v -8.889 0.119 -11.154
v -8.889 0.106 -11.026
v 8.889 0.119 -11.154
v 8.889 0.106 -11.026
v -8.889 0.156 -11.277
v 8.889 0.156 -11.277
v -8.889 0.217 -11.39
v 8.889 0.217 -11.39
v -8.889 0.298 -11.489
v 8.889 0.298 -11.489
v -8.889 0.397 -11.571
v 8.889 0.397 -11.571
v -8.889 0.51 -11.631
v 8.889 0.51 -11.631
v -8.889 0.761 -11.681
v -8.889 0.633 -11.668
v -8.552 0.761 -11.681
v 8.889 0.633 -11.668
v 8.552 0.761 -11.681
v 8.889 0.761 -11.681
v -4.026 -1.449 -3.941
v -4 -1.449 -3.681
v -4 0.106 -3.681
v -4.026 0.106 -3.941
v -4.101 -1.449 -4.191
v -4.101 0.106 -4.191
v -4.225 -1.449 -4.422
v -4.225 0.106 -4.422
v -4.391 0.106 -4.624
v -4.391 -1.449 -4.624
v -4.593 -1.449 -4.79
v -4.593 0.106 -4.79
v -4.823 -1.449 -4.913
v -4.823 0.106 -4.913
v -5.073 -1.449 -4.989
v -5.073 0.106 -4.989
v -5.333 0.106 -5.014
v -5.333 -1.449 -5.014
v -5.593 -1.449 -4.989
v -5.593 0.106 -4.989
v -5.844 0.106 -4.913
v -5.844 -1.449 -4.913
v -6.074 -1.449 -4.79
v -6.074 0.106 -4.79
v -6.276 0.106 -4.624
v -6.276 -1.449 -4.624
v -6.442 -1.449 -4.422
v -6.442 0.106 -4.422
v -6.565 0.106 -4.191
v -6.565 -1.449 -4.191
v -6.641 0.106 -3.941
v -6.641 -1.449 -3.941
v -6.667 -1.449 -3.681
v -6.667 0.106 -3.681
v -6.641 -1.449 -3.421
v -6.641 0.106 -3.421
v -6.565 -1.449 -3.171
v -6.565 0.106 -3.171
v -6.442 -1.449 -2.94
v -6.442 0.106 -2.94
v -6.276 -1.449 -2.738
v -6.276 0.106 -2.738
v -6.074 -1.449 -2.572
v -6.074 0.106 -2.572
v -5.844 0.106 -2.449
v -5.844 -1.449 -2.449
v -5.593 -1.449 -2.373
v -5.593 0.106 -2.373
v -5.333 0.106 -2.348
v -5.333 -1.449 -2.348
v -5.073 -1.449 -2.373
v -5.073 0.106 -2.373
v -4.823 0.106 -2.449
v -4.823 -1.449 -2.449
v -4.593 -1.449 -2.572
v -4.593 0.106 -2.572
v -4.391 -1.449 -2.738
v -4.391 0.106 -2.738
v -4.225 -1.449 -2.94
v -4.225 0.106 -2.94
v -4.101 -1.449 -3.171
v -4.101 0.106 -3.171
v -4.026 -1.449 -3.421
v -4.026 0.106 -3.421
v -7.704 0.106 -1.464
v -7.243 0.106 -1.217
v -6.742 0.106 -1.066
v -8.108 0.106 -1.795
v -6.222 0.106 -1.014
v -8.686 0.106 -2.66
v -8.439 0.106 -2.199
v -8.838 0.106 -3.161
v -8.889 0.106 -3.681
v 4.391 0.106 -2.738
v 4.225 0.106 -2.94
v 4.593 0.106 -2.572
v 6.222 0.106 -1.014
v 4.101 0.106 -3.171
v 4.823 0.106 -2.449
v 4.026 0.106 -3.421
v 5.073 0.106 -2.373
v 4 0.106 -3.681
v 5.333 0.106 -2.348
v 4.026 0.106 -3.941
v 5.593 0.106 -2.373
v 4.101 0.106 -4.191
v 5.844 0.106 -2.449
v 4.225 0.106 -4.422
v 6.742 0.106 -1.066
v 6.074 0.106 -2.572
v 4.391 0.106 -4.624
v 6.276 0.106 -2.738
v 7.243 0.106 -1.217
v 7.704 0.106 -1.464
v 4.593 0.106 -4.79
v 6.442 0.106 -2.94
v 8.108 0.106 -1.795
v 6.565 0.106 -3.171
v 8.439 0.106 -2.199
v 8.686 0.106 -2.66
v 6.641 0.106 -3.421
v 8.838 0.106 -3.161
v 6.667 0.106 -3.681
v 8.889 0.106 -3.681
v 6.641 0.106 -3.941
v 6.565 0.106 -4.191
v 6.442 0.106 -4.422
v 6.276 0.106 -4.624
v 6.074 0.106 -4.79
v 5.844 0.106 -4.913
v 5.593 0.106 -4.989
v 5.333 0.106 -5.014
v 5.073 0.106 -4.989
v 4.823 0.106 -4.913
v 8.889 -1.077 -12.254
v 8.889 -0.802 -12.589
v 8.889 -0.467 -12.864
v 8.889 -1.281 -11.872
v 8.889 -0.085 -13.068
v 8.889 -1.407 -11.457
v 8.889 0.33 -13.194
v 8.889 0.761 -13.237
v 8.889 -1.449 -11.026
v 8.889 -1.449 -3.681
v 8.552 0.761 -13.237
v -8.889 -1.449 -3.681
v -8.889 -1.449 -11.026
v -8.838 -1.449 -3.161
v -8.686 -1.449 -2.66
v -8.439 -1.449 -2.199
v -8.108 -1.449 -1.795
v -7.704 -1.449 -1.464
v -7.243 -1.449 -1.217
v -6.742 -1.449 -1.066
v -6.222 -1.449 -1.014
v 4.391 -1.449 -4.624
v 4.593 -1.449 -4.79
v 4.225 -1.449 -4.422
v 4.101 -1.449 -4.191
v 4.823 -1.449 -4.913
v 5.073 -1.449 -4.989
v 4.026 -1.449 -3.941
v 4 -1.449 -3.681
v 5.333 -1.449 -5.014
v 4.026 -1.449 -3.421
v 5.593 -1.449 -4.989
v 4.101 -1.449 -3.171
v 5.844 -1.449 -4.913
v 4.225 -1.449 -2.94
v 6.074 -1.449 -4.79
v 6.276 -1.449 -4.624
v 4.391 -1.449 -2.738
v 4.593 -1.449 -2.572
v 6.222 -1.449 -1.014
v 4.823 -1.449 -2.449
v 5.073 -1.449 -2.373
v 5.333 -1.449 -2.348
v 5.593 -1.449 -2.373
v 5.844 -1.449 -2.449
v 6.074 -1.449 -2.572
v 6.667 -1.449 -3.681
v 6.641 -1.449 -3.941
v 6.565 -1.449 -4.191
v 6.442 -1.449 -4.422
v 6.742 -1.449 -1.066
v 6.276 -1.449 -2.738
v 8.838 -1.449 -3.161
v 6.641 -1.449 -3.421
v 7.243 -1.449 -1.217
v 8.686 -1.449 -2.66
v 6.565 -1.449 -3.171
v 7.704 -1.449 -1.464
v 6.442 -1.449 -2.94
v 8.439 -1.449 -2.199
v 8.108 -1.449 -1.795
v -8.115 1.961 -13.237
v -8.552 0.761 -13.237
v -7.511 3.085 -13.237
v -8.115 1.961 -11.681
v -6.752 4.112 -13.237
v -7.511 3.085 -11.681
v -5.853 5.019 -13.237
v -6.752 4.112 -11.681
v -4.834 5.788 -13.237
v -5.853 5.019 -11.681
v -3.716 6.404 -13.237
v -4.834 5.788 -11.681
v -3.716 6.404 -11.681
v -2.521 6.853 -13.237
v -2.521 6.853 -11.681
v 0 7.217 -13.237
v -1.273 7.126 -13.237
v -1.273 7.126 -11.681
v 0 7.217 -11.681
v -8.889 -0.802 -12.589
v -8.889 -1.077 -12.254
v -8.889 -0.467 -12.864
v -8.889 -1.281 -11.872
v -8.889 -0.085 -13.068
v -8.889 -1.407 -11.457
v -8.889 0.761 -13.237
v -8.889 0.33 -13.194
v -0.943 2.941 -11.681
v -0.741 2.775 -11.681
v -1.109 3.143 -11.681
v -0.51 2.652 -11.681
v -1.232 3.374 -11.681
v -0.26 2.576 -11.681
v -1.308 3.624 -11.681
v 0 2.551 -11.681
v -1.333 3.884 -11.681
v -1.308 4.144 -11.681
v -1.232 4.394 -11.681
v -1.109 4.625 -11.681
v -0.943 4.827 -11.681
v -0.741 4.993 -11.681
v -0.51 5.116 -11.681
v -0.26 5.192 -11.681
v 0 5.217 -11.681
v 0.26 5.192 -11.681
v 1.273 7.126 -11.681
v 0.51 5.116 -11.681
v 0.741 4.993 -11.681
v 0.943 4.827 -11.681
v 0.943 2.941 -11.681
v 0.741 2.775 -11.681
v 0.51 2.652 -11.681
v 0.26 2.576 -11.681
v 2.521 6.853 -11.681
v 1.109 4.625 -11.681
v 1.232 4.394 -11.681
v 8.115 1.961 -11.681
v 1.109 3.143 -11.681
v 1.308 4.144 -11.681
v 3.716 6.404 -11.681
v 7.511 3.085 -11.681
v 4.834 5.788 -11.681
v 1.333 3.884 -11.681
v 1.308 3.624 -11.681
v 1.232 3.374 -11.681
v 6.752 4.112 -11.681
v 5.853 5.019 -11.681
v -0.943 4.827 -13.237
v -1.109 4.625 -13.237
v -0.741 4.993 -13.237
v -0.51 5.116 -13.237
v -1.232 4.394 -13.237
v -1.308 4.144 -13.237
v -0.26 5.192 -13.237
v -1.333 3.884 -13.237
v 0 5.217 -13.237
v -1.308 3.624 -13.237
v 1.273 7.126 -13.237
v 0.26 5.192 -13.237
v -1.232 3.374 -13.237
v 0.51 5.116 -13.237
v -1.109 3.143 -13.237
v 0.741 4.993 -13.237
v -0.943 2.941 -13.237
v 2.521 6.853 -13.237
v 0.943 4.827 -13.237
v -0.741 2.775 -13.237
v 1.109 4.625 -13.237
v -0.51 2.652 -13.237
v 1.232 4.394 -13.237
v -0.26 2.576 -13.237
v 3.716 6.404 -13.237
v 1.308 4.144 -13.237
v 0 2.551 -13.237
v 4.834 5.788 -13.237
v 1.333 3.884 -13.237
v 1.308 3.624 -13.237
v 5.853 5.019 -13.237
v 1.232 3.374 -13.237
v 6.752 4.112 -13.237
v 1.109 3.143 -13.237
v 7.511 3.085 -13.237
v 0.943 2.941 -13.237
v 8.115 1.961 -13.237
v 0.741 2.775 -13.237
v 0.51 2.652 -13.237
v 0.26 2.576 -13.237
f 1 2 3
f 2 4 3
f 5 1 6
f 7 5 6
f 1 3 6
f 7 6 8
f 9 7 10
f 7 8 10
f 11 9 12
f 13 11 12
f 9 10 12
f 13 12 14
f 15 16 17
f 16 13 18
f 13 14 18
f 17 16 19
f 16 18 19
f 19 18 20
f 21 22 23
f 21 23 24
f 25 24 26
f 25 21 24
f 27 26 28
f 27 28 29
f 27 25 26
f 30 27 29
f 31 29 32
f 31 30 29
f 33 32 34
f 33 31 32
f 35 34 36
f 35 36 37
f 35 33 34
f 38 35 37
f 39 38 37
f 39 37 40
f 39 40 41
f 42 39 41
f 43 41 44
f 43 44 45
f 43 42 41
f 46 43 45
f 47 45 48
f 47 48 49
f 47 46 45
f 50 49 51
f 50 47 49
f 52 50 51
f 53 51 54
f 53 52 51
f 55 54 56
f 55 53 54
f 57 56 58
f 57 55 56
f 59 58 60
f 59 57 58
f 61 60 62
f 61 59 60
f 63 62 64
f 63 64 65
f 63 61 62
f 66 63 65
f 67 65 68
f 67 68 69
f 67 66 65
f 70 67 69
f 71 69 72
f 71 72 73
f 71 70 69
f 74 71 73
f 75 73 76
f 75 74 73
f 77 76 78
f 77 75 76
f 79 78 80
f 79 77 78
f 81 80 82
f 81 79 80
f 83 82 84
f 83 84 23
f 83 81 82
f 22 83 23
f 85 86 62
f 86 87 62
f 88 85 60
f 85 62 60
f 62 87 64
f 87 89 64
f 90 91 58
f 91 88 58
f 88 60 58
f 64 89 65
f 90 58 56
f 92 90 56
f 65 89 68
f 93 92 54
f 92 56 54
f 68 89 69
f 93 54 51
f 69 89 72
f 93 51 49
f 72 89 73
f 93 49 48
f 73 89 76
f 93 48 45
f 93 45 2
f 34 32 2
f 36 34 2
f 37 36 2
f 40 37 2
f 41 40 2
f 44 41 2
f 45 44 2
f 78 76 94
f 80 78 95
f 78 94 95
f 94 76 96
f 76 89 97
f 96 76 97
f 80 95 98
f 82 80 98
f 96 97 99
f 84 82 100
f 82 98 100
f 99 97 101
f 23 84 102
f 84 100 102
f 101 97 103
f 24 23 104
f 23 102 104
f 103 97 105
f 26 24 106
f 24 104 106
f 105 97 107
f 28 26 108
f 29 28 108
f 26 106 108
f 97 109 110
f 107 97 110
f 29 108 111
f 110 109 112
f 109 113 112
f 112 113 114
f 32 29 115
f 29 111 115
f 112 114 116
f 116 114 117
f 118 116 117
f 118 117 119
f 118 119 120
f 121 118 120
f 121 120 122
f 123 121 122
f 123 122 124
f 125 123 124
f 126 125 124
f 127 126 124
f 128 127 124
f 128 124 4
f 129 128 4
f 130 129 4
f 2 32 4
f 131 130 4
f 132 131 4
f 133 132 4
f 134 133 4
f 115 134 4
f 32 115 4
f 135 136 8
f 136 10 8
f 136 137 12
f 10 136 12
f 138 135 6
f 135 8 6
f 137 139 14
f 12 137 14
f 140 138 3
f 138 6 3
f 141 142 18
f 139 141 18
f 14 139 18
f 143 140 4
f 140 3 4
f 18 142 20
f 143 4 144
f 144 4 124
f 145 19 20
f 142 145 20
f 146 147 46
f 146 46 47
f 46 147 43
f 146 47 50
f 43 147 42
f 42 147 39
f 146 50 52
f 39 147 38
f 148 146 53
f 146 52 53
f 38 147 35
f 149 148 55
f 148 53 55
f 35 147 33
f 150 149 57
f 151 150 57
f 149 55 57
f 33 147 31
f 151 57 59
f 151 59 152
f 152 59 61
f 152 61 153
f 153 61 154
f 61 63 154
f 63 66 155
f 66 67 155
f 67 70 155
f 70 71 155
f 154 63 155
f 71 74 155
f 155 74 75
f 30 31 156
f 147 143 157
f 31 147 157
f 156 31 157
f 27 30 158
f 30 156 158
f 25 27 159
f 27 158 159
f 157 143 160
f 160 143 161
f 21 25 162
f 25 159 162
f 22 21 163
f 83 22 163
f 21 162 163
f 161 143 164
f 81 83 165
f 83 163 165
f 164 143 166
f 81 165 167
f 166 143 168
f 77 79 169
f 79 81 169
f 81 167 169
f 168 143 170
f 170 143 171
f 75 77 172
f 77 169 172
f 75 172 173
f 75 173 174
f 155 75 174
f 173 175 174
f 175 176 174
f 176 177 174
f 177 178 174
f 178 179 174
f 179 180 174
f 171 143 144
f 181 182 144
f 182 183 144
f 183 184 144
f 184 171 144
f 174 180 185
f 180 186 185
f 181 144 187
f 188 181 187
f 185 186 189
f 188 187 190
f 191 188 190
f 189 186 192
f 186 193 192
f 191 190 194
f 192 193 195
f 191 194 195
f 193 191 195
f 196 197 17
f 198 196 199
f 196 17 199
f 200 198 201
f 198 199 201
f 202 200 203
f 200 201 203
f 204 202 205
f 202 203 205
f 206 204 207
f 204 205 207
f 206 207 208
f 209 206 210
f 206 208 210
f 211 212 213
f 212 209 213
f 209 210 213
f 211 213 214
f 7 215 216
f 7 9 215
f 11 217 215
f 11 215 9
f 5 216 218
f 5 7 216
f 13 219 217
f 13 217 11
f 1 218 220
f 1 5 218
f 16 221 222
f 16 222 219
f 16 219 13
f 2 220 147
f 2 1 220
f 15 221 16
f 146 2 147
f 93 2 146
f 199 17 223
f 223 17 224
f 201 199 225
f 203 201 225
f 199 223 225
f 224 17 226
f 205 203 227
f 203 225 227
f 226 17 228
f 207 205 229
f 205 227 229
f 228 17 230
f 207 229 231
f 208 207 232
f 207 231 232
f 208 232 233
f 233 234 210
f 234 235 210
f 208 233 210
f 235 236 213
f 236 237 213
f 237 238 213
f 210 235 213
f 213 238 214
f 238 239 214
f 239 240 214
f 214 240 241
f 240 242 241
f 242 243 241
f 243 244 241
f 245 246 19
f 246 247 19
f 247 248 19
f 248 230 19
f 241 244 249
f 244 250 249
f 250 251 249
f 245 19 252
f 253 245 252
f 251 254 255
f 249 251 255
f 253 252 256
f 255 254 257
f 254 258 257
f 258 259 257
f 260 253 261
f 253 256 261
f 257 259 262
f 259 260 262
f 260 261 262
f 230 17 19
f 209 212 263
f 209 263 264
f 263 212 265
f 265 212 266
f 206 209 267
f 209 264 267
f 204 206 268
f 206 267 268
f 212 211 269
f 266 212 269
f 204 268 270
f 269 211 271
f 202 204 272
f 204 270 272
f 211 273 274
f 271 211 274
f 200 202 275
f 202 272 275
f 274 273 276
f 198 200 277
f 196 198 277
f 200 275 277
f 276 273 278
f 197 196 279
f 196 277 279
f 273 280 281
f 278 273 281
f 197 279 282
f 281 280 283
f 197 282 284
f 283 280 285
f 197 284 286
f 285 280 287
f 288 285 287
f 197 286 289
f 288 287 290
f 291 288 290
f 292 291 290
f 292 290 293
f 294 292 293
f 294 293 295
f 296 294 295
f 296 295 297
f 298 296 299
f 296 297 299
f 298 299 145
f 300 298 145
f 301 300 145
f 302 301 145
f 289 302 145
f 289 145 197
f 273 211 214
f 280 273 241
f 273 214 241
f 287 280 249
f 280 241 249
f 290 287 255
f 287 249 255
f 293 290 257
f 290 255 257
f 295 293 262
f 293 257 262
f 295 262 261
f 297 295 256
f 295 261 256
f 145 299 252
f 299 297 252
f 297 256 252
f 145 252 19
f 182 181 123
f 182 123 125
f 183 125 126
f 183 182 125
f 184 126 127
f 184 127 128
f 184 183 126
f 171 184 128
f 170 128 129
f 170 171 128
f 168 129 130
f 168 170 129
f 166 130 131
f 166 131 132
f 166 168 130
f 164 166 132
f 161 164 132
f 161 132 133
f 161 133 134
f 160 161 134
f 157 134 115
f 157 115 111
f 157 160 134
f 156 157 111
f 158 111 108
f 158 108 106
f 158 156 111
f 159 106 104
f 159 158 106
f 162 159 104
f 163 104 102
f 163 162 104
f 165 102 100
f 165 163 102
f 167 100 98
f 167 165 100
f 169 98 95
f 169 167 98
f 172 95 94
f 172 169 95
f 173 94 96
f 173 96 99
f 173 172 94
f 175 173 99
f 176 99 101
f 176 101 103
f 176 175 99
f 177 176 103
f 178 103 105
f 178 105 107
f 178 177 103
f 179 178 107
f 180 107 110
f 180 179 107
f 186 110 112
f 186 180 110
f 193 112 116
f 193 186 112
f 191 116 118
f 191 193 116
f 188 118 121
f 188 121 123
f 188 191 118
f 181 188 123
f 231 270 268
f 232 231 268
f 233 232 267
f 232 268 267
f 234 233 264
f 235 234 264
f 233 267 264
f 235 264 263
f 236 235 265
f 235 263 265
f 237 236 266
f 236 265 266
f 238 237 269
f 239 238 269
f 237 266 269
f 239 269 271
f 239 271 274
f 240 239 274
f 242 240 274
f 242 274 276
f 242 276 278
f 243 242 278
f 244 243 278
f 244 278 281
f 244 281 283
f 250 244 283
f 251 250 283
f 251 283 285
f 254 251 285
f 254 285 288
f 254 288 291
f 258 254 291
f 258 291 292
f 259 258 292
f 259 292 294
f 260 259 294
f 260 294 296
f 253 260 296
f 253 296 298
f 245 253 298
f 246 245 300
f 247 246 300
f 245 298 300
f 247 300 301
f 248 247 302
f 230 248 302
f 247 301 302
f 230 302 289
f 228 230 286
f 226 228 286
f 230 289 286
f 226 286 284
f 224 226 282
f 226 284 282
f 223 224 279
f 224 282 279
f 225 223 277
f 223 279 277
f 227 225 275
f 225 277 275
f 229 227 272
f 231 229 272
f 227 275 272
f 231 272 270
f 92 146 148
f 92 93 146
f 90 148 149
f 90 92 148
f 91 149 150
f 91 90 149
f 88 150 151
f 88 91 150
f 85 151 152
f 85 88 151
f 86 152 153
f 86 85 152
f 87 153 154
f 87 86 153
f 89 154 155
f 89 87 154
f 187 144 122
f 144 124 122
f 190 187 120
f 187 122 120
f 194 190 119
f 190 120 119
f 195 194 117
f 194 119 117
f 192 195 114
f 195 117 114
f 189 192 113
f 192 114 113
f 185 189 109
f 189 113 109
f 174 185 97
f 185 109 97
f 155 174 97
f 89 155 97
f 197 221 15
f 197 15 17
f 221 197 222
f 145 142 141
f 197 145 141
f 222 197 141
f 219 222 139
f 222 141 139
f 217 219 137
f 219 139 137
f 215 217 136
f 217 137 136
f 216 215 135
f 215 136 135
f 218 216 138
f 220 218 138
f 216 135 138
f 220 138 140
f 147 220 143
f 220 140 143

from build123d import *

# Parameters (mm, degrees)
BASE_FLANGE1_DEPTH        = 10
FILLET1_R                 = 3
CORTAR_EXTRUIR1_START     = -1.75
CORTAR_EXTRUIR1_OUTLINE_R = 1.5
CORTAR_EXTRUIR1_DEPTH     = 1.75
CORTAR_EXTRUIR2_REACH     = 20.79
CROQUIS2_R                = 1.5
SCALE1_SCALE              = 0.888888889
CUT_EXTRUDE2_REACH        = 17.649


# Read off the part's stored shape, not the designer's step: Cortar-Extruir1
# Sheet-metal steps are written as plain solids
with BuildPart() as part:
    # Sketch1 → Base-Flange1 (new, symmetric)
    with BuildSketch(Plane(origin=(0, 0, 0), x_dir=(0, 0, -1), z_dir=(1, 0, 0))):
        with BuildLine():
            Line((0, 0), (11.2634, 0))
            ThreePointArc((11.2634, 0), (11.784254855, 0.215745145), (12, 0.7366))
            Line((12, 0.7366), (12, 8))
            Line((12, 8), (13.75, 8))
            Line((13.75, 8), (13.75, 0.7366))
            ThreePointArc((13.75, 0.7366), (13.021691722, -1.021691722), (11.2634, -1.75))
            Line((11.2634, -1.75), (0, -1.75))
            Line((0, -1.75), (0, 0))
        make_face()
    extrude(amount=BASE_FLANGE1_DEPTH, both=True)

    # Fillet1
    fillet1_edges = [part.edges().sort_by_distance(p)[0] for p in [
        (10, -0.875, 0),
        (10, 8, -12.875),
        (-10, -0.875, 0),
        (-10, 8, -12.875),
    ]]
    fillet(fillet1_edges, radius=FILLET1_R)

    # Cortar-Extruir1 outline → Cortar-Extruir1 (cut)
    with BuildSketch(Plane(origin=(0, 0, 0), x_dir=(1, 0, 0), z_dir=(0, 1, 0)).offset(CORTAR_EXTRUIR1_START)):
        with Locations((-6, 3)):
            Circle(CORTAR_EXTRUIR1_OUTLINE_R)
        with Locations((6, 3)):
            Circle(CORTAR_EXTRUIR1_OUTLINE_R)
    extrude(amount=CORTAR_EXTRUIR1_DEPTH, mode=Mode.SUBTRACT)

    # Croquis2 → Cortar-Extruir2 (cut, up to next)
    with BuildSketch(Plane(origin=(0, 0, -13.75), x_dir=(-1, 0, 0), z_dir=(0, 0, -1)), mode=Mode.PRIVATE) as cortar_extruir2_sk1:
        with Locations((0, 4.25)):
            Circle(CROQUIS2_R)
    cortar_extruir2_tool1 = extrude(cortar_extruir2_sk1.sketch, amount=-CORTAR_EXTRUIR2_REACH, mode=Mode.PRIVATE) & part.part
    add(cortar_extruir2_tool1.solids().sort_by_distance((0, 4.25, -13.75))[0], mode=Mode.SUBTRACT)


with BuildPart() as part_1:
    # Scale1: scaled about (0, 0.956325362, -9.128568618)
    add(part.part.scale(SCALE1_SCALE).moved(Location((0, 0.106258374, -1.014285402))))

    # Sketch2 → Cut-Extrude2 (cut, up to next)
    with BuildSketch(Plane.XY.offset(-11.680952069), mode=Mode.PRIVATE) as cut_extrude2_sk1:
        with BuildLine():
            Line((-8.888888889, 4.550702818), (-8.888888889, 0.761013929))
            Line((-8.888888889, 0.761013929), (-8.551720038, 0.761013929))
            ThreePointArc((-8.551720038, 0.761013929), (-5.357621736, 5.42203153), (0, 7.217369485))
            Line((0, 7.217369485), (-6.222222222, 7.217369485))
            ThreePointArc((-6.222222222, 7.217369485), (-8.107840305, 6.436320901), (-8.888888889, 4.550702818))
        make_face()
    cut_extrude2_tool1 = extrude(cut_extrude2_sk1.sketch, amount=-CUT_EXTRUDE2_REACH, mode=Mode.PRIVATE) & part_1.part
    # Sketch2 → Cut-Extrude2 (cut, up to next)
    with BuildSketch(Plane.XY.offset(-11.680952069), mode=Mode.PRIVATE) as cut_extrude2_sk2:
        with BuildLine():
            Line((6.222222222, 7.217369485), (0, 7.217369485))
            ThreePointArc((0, 7.217369485), (5.357621736, 5.42203153), (8.551720038, 0.761013929))
            Line((8.551720038, 0.761013929), (8.888888889, 0.761013929))
            Line((8.888888889, 0.761013929), (8.888888889, 4.550702818))
            ThreePointArc((8.888888889, 4.550702818), (8.107840305, 6.436320901), (6.222222222, 7.217369485))
        make_face()
    cut_extrude2_tool2 = extrude(cut_extrude2_sk2.sketch, amount=-CUT_EXTRUDE2_REACH, mode=Mode.PRIVATE) & part_1.part
    add(cut_extrude2_tool1.solids().sort_by_distance((-6.729341, 5.184457, -11.680952))[0], mode=Mode.SUBTRACT)
    add(cut_extrude2_tool2.solids().sort_by_distance((6.729341, 5.184457, -11.680952))[0], mode=Mode.SUBTRACT)


solid = part_1.part
